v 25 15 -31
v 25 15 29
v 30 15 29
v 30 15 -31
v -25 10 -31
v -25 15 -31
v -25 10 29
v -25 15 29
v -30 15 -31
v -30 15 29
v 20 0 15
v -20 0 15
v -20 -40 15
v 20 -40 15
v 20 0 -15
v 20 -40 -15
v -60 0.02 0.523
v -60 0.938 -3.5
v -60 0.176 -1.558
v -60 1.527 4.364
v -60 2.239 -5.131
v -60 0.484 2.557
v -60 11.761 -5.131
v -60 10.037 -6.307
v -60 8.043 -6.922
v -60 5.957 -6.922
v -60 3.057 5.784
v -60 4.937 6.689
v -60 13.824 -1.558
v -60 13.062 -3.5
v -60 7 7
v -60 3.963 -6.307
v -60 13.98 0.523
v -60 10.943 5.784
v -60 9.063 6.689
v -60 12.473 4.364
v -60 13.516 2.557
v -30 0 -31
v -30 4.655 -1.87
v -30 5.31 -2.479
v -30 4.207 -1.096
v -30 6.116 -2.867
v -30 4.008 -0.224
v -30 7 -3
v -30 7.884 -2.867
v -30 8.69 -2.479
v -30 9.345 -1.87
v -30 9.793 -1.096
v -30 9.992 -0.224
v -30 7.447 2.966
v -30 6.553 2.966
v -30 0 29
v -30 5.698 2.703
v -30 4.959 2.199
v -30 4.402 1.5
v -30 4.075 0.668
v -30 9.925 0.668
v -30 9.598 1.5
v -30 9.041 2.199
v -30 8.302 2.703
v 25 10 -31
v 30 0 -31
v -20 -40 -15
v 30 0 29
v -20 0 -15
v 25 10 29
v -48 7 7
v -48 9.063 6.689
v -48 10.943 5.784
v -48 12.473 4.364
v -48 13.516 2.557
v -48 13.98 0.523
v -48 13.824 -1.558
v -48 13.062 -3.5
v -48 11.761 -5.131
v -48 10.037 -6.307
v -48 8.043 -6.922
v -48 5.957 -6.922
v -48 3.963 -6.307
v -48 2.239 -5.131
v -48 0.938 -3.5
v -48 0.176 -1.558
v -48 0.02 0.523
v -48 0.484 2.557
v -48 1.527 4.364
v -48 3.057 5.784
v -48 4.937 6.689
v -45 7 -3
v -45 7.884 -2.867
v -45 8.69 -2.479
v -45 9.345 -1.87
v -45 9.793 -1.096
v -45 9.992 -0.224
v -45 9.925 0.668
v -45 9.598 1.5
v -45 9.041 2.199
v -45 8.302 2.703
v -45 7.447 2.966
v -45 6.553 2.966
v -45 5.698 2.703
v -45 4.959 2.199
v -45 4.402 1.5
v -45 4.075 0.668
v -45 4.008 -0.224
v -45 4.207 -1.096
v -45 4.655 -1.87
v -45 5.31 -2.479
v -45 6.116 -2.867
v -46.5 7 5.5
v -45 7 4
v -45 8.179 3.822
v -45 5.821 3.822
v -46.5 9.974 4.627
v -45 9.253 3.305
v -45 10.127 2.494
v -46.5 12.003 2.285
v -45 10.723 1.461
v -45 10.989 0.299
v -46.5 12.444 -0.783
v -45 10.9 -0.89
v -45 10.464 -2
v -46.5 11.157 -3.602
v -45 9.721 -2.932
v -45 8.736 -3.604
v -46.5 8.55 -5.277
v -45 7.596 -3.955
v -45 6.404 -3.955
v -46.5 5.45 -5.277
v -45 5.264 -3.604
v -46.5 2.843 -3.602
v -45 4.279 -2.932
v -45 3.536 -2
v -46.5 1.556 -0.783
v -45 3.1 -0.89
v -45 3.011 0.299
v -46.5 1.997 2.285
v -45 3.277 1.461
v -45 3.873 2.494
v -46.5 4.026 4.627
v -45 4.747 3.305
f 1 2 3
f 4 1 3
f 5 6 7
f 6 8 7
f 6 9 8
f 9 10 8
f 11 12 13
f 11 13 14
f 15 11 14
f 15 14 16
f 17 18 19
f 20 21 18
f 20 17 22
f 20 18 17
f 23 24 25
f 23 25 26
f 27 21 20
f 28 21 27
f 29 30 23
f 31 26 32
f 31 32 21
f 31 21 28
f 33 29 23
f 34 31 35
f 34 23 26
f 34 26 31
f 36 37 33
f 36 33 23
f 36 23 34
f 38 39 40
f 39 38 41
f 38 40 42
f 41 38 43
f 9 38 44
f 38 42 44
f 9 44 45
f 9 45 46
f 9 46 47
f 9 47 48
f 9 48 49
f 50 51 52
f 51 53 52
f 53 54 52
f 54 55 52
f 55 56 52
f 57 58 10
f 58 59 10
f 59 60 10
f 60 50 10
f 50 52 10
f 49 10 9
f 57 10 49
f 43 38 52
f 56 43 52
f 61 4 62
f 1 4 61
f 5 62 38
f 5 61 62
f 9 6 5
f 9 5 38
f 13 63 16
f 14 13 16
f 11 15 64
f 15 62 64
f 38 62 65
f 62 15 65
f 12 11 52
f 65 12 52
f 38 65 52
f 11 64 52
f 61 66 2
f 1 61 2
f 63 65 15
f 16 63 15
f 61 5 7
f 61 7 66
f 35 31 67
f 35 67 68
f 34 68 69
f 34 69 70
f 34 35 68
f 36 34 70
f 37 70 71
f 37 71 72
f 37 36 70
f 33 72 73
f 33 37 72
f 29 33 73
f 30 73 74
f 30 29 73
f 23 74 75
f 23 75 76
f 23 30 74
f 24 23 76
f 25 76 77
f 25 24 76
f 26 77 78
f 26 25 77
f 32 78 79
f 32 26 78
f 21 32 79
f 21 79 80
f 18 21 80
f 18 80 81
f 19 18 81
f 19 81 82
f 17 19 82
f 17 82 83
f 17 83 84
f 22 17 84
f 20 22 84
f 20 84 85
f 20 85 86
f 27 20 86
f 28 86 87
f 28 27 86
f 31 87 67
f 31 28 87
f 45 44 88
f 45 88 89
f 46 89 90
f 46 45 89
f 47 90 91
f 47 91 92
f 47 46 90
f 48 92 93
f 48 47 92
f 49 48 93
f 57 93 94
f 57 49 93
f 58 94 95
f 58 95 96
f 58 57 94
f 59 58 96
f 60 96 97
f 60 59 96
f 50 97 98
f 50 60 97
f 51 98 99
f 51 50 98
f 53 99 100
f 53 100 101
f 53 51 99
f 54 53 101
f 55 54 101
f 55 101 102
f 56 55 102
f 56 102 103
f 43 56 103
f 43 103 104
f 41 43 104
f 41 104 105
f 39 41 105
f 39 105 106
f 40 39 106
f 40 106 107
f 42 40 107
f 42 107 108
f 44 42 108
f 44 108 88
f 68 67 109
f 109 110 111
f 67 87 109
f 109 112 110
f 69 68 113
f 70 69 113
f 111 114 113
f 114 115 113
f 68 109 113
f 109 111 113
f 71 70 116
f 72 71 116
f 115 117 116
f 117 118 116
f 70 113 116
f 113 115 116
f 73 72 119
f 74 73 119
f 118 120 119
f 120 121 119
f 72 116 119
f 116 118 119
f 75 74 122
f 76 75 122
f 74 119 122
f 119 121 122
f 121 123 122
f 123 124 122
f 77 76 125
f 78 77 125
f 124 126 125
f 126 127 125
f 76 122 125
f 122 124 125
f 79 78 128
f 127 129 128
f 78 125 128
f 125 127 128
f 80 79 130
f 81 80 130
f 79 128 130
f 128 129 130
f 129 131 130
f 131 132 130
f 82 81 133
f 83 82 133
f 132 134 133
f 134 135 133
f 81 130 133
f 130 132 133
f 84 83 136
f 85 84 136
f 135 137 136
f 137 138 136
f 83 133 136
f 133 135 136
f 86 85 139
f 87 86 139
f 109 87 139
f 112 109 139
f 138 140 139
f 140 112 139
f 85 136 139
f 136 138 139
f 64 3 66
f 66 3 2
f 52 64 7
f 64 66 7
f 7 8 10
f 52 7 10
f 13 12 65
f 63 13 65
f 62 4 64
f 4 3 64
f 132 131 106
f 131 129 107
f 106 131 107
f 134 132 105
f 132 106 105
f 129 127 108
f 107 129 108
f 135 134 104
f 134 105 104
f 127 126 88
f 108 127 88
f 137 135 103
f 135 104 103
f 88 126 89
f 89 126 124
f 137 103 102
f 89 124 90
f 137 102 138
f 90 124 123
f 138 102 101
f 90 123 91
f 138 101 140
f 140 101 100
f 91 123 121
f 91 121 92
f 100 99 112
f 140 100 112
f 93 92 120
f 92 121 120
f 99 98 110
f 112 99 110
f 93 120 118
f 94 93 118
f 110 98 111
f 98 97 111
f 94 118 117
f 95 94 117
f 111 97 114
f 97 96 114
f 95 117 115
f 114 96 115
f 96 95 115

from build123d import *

# Parameters (mm, degrees)
SKETCH1_W           = 40
SKETCH1_H           = 30
BOSS_EXTRUDE1_DEPTH = 40
BOSS_EXTRUDE2_DEPTH = 29
BOSS_EXTRUDE3_DEPTH = 31
BOSS_EXTRUDE4_START = -55
SKETCH4_R           = 3
BOSS_EXTRUDE4_DEPTH = 35
SKETCH5_R           = 7
BOSS_EXTRUDE5_DEPTH = 15
CHAMFER1_SIZE       = 3


with BuildPart() as part:
    # Sketch1 → Boss-Extrude1 (new body)
    with BuildSketch(Plane(origin=(0, 0, 0), x_dir=(1, 0, 0), z_dir=(0, 1, 0))):
        Rectangle(SKETCH1_W, SKETCH1_H)
    extrude(amount=-BOSS_EXTRUDE1_DEPTH)

    # Sketch3 → Boss-Extrude2 (add)
    with BuildSketch(Plane.XY):
        Polygon((25, 15), (30, 15), (30, 0), (-30, 0), (-30, 15), (-25, 15), (-25, 10), (25, 10), align=None)
    extrude(amount=BOSS_EXTRUDE2_DEPTH)

    # Sketch3<2> → Boss-Extrude3 (add)
    with BuildSketch(Plane.XY):
        Polygon((25, 15), (30, 15), (30, 0), (-30, 0), (-30, 15), (-25, 15), (-25, 10), (25, 10), align=None)
    extrude(amount=-BOSS_EXTRUDE3_DEPTH)

    # Sketch4 → Boss-Extrude4 (add)
    with BuildSketch(Plane(origin=(30, 0, 0), x_dir=(0, 0, -1), z_dir=(1, 0, 0)).offset(BOSS_EXTRUDE4_START)):
        with Locations((0, 7)):
            Circle(SKETCH4_R)
    extrude(amount=-BOSS_EXTRUDE4_DEPTH)

    # Sketch5 → Boss-Extrude5 (add)
    with BuildSketch(Plane.ZY.offset(60)):
        with Locations((0, 7)):
            Circle(SKETCH5_R)
    extrude(amount=-BOSS_EXTRUDE5_DEPTH)

    # Chamfer1
    chamfer1_edges = [part.edges().sort_by_distance(p)[0] for p in [
        (-45, 7, -7),
    ]]
    chamfer(chamfer1_edges, length=CHAMFER1_SIZE)


solid = part.part
